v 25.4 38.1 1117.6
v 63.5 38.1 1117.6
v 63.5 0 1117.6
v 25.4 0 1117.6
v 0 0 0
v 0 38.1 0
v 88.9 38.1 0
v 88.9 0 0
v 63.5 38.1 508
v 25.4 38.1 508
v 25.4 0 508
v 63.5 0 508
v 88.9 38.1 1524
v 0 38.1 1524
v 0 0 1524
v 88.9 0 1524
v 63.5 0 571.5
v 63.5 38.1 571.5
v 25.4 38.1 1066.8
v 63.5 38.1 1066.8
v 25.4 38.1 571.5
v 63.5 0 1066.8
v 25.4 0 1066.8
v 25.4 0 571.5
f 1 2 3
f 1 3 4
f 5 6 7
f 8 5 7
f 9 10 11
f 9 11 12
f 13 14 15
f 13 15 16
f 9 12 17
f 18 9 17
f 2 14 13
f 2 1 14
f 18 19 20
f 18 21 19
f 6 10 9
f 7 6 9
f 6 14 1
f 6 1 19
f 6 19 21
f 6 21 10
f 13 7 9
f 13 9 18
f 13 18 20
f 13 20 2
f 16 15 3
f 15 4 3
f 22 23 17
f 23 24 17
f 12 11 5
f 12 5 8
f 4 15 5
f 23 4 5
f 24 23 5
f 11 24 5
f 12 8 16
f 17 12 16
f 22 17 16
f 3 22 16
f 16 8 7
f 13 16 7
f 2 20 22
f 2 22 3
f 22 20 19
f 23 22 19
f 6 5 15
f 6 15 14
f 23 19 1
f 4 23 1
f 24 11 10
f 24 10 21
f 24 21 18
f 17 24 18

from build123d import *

# Parameters (mm, degrees)
F0_W     = 88.9
F0_H     = 38.1
F1_DEPTH = 1524
F2_W     = 38.1
F2_H     = 50.8
F3_DEPTH = 38.1
F4_W     = 38.1
F4_H     = 63.5
F5_DEPTH = 38.1


with BuildPart() as f1:
    # F0 (on Top) → F1 (new body)
    with BuildSketch(Plane.XY):
        with Locations((44.45, 19.05)):
            Rectangle(F0_W, F0_H)
    extrude(amount=F1_DEPTH)

    # F2 (on face) → F3 (cut, through all)
    with BuildSketch(Plane(origin=(0, 38.1, 0), x_dir=(-1, 0, 0), z_dir=(0, 1, 0))):
        with Locations((-44.45, 1092.2)):
            Rectangle(F2_W, F2_H)
    extrude(amount=-F3_DEPTH, mode=Mode.SUBTRACT)

    # F4 (on face) → F5 (cut, through all)
    with BuildSketch(Plane.XZ):
        with Locations((44.45, 539.75)):
            Rectangle(F4_W, F4_H)
    extrude(amount=-F5_DEPTH, mode=Mode.SUBTRACT)


solid = f1.part
